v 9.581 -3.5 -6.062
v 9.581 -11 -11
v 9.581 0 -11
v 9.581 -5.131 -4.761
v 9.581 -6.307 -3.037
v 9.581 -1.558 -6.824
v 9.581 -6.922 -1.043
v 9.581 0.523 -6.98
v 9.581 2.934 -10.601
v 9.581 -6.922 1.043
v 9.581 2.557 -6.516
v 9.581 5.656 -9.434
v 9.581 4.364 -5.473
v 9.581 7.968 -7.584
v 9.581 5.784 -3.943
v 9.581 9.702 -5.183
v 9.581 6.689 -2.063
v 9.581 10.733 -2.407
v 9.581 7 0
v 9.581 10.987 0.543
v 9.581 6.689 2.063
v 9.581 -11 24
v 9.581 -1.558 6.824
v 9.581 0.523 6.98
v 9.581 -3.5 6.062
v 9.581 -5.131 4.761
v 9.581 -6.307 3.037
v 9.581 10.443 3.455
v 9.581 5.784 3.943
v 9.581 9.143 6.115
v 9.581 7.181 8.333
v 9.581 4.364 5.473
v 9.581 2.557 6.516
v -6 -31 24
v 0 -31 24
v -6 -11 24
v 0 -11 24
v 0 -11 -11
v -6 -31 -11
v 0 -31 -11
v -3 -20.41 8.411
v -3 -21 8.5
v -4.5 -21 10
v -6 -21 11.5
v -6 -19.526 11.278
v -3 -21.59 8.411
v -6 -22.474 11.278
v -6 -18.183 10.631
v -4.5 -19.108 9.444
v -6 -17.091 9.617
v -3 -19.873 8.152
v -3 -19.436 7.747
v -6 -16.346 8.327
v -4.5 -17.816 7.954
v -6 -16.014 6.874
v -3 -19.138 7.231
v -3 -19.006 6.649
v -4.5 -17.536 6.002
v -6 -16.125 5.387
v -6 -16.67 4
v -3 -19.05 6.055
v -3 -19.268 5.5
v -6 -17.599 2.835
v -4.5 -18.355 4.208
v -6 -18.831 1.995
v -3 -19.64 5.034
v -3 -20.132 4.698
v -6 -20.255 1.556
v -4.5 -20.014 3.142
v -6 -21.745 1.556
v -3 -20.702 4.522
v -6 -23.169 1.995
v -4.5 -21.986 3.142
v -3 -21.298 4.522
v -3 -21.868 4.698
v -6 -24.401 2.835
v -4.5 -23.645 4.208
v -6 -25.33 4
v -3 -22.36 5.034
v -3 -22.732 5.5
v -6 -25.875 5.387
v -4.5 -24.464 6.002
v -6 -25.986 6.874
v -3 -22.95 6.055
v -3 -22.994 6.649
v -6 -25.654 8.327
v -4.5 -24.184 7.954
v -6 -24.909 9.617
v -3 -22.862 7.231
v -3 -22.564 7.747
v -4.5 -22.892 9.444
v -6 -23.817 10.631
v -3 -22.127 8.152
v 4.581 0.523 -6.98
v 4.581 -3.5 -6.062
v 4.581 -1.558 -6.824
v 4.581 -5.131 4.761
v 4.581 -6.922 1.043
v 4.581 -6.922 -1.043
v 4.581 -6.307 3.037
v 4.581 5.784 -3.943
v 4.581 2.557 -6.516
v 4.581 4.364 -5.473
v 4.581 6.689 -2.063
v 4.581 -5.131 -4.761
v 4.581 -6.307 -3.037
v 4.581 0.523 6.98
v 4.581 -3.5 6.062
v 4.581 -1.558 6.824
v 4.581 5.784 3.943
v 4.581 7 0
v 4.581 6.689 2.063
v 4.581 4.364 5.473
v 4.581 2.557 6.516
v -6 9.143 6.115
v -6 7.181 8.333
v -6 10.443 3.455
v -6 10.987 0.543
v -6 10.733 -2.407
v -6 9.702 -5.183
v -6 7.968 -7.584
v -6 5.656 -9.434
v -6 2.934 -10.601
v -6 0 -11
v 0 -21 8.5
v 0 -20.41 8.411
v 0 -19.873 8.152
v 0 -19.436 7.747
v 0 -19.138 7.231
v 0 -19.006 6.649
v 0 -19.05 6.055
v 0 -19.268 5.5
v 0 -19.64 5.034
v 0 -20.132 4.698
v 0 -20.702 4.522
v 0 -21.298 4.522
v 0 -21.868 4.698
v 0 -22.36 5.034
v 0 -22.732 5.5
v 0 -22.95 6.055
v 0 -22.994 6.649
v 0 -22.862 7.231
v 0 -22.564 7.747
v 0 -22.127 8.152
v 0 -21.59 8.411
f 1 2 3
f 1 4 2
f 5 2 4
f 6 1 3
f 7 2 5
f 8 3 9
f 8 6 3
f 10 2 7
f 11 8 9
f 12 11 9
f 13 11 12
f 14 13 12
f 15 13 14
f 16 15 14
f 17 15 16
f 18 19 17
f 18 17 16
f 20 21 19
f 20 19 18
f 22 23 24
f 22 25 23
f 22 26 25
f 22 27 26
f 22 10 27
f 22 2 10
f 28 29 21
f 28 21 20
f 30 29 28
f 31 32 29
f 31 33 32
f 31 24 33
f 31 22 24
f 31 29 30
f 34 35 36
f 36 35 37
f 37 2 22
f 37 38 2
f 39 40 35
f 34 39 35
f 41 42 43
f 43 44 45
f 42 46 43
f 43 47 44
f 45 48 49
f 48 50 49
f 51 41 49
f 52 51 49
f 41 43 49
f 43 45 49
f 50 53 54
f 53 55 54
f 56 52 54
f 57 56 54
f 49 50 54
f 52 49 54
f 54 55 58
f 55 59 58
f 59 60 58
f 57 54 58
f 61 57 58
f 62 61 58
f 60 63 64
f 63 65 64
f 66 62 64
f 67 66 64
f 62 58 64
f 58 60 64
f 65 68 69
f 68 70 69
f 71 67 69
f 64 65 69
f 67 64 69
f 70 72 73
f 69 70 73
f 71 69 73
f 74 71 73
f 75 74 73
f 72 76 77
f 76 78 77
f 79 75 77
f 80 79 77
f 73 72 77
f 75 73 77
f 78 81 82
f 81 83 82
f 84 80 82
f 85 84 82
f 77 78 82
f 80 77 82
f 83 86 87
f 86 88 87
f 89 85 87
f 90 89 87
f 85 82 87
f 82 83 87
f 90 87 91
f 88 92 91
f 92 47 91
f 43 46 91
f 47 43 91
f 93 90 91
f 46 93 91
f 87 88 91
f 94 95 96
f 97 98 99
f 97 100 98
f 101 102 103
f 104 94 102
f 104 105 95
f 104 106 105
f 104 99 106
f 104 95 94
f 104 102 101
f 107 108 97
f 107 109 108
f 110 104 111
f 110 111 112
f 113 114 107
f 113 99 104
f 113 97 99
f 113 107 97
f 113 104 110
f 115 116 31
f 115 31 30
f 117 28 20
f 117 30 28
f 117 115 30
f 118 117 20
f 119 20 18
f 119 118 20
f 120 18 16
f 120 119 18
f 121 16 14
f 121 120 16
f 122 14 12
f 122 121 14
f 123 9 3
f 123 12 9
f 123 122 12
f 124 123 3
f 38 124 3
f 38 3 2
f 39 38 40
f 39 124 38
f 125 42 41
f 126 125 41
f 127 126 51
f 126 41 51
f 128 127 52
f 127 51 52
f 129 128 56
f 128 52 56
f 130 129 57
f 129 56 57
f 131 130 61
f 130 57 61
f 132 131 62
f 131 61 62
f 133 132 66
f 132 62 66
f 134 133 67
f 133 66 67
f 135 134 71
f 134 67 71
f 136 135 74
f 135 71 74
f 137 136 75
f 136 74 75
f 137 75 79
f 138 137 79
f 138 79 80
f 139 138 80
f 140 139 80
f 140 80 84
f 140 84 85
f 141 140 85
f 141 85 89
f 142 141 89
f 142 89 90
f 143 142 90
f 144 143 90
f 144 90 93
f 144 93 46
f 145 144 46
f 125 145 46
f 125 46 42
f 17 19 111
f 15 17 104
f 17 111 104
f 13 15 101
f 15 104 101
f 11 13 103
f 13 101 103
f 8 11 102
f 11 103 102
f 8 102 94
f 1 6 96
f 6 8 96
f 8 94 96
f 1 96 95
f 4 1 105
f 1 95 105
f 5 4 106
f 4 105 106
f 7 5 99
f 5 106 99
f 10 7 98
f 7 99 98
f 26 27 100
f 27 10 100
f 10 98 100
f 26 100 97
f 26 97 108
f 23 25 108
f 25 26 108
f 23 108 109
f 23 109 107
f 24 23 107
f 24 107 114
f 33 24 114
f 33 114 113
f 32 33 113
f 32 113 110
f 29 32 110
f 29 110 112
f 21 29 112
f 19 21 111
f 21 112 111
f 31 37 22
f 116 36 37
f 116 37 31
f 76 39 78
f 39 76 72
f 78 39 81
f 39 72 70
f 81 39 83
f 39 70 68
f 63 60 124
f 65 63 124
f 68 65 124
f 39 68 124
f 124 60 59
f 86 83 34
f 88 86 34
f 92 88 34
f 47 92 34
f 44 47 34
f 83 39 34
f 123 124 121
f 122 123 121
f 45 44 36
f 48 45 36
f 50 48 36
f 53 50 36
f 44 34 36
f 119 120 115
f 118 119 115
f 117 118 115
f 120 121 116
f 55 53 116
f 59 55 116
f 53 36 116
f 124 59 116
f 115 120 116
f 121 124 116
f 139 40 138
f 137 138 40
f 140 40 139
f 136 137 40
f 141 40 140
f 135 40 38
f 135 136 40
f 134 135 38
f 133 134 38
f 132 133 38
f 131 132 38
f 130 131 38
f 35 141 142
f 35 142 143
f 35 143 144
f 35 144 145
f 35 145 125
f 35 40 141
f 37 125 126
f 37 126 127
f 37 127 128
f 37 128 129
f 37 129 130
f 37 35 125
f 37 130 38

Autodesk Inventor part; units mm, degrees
ref_plane "YZ Plane" through (0, 0, 0) normal (1, 0, 0) x (0, 1, 0)
ref_plane "XZ Plane" through (0, 0, 0) normal (0, 1, 0) x (-1, 0, 0)
ref_plane "XY Plane" through (0, 0, 0) normal (0, 0, 1) x (1, 0, 0)
sketch "Sketch1" plane through (0, 0, 0) normal (1, 0, 0) x (0, 1, 0)
  circle A0 centre (0, 0) radius 7
  line L0 (0, -11) -> (-31, -11)
  line L1 (-31, -11) -> (-31, 24)
  line L2 (-11, -11) -> (-11, 24)
  line L3 (-31, 24) -> (-11, 24)
  line L4 (0, -20.9958) -> (0, 31.4993) projected
  arc A1 (0, -11) -> (7.1808, 8.3329) centre (0, 0) ccw
  line L5 (-11, 24) -> (7.1808, 8.3329)
  dimension "d0" = 14
  dimension "d3" = 11
  dimension "d4" = 35
  dimension "d6" = 22
  dimension "d7" = 31
extrude "Extrusion1" add sketch "Sketch1" along normal blind 9.5813 contours A0 L4 L5 A1 | A0 L4 L0 L2 L5
extrude "Extrusion2" add sketch "Sketch1" along normal blind 4.5813 contours A0 L4 | L4 A0
extrude "Extrusion3" add sketch "Sketch1" against normal blind 6
sketch "Sketch2" plane through (-6, 0, 0) normal (-1, 0, 0) x (0, 0, 1)
  circle A0 centre (6.5, -21) radius 2
  line L0 (-11, -31) -> (24, -31) projected
  line L1 (-11, 0) -> (-11, -31) projected
  point P0 (0, 0)
  dimension "d14" = 4
  dimension "d15" = 10
  dimension "d16" = 17.5
extrude "Extrusion4" cut sketch "Sketch2" against normal blind 10
chamfer "Chamfer1" distance 3 angle 45 1 edges at (-6, -21, 4.5)
properties part number "bearing_holder_v2_left"
